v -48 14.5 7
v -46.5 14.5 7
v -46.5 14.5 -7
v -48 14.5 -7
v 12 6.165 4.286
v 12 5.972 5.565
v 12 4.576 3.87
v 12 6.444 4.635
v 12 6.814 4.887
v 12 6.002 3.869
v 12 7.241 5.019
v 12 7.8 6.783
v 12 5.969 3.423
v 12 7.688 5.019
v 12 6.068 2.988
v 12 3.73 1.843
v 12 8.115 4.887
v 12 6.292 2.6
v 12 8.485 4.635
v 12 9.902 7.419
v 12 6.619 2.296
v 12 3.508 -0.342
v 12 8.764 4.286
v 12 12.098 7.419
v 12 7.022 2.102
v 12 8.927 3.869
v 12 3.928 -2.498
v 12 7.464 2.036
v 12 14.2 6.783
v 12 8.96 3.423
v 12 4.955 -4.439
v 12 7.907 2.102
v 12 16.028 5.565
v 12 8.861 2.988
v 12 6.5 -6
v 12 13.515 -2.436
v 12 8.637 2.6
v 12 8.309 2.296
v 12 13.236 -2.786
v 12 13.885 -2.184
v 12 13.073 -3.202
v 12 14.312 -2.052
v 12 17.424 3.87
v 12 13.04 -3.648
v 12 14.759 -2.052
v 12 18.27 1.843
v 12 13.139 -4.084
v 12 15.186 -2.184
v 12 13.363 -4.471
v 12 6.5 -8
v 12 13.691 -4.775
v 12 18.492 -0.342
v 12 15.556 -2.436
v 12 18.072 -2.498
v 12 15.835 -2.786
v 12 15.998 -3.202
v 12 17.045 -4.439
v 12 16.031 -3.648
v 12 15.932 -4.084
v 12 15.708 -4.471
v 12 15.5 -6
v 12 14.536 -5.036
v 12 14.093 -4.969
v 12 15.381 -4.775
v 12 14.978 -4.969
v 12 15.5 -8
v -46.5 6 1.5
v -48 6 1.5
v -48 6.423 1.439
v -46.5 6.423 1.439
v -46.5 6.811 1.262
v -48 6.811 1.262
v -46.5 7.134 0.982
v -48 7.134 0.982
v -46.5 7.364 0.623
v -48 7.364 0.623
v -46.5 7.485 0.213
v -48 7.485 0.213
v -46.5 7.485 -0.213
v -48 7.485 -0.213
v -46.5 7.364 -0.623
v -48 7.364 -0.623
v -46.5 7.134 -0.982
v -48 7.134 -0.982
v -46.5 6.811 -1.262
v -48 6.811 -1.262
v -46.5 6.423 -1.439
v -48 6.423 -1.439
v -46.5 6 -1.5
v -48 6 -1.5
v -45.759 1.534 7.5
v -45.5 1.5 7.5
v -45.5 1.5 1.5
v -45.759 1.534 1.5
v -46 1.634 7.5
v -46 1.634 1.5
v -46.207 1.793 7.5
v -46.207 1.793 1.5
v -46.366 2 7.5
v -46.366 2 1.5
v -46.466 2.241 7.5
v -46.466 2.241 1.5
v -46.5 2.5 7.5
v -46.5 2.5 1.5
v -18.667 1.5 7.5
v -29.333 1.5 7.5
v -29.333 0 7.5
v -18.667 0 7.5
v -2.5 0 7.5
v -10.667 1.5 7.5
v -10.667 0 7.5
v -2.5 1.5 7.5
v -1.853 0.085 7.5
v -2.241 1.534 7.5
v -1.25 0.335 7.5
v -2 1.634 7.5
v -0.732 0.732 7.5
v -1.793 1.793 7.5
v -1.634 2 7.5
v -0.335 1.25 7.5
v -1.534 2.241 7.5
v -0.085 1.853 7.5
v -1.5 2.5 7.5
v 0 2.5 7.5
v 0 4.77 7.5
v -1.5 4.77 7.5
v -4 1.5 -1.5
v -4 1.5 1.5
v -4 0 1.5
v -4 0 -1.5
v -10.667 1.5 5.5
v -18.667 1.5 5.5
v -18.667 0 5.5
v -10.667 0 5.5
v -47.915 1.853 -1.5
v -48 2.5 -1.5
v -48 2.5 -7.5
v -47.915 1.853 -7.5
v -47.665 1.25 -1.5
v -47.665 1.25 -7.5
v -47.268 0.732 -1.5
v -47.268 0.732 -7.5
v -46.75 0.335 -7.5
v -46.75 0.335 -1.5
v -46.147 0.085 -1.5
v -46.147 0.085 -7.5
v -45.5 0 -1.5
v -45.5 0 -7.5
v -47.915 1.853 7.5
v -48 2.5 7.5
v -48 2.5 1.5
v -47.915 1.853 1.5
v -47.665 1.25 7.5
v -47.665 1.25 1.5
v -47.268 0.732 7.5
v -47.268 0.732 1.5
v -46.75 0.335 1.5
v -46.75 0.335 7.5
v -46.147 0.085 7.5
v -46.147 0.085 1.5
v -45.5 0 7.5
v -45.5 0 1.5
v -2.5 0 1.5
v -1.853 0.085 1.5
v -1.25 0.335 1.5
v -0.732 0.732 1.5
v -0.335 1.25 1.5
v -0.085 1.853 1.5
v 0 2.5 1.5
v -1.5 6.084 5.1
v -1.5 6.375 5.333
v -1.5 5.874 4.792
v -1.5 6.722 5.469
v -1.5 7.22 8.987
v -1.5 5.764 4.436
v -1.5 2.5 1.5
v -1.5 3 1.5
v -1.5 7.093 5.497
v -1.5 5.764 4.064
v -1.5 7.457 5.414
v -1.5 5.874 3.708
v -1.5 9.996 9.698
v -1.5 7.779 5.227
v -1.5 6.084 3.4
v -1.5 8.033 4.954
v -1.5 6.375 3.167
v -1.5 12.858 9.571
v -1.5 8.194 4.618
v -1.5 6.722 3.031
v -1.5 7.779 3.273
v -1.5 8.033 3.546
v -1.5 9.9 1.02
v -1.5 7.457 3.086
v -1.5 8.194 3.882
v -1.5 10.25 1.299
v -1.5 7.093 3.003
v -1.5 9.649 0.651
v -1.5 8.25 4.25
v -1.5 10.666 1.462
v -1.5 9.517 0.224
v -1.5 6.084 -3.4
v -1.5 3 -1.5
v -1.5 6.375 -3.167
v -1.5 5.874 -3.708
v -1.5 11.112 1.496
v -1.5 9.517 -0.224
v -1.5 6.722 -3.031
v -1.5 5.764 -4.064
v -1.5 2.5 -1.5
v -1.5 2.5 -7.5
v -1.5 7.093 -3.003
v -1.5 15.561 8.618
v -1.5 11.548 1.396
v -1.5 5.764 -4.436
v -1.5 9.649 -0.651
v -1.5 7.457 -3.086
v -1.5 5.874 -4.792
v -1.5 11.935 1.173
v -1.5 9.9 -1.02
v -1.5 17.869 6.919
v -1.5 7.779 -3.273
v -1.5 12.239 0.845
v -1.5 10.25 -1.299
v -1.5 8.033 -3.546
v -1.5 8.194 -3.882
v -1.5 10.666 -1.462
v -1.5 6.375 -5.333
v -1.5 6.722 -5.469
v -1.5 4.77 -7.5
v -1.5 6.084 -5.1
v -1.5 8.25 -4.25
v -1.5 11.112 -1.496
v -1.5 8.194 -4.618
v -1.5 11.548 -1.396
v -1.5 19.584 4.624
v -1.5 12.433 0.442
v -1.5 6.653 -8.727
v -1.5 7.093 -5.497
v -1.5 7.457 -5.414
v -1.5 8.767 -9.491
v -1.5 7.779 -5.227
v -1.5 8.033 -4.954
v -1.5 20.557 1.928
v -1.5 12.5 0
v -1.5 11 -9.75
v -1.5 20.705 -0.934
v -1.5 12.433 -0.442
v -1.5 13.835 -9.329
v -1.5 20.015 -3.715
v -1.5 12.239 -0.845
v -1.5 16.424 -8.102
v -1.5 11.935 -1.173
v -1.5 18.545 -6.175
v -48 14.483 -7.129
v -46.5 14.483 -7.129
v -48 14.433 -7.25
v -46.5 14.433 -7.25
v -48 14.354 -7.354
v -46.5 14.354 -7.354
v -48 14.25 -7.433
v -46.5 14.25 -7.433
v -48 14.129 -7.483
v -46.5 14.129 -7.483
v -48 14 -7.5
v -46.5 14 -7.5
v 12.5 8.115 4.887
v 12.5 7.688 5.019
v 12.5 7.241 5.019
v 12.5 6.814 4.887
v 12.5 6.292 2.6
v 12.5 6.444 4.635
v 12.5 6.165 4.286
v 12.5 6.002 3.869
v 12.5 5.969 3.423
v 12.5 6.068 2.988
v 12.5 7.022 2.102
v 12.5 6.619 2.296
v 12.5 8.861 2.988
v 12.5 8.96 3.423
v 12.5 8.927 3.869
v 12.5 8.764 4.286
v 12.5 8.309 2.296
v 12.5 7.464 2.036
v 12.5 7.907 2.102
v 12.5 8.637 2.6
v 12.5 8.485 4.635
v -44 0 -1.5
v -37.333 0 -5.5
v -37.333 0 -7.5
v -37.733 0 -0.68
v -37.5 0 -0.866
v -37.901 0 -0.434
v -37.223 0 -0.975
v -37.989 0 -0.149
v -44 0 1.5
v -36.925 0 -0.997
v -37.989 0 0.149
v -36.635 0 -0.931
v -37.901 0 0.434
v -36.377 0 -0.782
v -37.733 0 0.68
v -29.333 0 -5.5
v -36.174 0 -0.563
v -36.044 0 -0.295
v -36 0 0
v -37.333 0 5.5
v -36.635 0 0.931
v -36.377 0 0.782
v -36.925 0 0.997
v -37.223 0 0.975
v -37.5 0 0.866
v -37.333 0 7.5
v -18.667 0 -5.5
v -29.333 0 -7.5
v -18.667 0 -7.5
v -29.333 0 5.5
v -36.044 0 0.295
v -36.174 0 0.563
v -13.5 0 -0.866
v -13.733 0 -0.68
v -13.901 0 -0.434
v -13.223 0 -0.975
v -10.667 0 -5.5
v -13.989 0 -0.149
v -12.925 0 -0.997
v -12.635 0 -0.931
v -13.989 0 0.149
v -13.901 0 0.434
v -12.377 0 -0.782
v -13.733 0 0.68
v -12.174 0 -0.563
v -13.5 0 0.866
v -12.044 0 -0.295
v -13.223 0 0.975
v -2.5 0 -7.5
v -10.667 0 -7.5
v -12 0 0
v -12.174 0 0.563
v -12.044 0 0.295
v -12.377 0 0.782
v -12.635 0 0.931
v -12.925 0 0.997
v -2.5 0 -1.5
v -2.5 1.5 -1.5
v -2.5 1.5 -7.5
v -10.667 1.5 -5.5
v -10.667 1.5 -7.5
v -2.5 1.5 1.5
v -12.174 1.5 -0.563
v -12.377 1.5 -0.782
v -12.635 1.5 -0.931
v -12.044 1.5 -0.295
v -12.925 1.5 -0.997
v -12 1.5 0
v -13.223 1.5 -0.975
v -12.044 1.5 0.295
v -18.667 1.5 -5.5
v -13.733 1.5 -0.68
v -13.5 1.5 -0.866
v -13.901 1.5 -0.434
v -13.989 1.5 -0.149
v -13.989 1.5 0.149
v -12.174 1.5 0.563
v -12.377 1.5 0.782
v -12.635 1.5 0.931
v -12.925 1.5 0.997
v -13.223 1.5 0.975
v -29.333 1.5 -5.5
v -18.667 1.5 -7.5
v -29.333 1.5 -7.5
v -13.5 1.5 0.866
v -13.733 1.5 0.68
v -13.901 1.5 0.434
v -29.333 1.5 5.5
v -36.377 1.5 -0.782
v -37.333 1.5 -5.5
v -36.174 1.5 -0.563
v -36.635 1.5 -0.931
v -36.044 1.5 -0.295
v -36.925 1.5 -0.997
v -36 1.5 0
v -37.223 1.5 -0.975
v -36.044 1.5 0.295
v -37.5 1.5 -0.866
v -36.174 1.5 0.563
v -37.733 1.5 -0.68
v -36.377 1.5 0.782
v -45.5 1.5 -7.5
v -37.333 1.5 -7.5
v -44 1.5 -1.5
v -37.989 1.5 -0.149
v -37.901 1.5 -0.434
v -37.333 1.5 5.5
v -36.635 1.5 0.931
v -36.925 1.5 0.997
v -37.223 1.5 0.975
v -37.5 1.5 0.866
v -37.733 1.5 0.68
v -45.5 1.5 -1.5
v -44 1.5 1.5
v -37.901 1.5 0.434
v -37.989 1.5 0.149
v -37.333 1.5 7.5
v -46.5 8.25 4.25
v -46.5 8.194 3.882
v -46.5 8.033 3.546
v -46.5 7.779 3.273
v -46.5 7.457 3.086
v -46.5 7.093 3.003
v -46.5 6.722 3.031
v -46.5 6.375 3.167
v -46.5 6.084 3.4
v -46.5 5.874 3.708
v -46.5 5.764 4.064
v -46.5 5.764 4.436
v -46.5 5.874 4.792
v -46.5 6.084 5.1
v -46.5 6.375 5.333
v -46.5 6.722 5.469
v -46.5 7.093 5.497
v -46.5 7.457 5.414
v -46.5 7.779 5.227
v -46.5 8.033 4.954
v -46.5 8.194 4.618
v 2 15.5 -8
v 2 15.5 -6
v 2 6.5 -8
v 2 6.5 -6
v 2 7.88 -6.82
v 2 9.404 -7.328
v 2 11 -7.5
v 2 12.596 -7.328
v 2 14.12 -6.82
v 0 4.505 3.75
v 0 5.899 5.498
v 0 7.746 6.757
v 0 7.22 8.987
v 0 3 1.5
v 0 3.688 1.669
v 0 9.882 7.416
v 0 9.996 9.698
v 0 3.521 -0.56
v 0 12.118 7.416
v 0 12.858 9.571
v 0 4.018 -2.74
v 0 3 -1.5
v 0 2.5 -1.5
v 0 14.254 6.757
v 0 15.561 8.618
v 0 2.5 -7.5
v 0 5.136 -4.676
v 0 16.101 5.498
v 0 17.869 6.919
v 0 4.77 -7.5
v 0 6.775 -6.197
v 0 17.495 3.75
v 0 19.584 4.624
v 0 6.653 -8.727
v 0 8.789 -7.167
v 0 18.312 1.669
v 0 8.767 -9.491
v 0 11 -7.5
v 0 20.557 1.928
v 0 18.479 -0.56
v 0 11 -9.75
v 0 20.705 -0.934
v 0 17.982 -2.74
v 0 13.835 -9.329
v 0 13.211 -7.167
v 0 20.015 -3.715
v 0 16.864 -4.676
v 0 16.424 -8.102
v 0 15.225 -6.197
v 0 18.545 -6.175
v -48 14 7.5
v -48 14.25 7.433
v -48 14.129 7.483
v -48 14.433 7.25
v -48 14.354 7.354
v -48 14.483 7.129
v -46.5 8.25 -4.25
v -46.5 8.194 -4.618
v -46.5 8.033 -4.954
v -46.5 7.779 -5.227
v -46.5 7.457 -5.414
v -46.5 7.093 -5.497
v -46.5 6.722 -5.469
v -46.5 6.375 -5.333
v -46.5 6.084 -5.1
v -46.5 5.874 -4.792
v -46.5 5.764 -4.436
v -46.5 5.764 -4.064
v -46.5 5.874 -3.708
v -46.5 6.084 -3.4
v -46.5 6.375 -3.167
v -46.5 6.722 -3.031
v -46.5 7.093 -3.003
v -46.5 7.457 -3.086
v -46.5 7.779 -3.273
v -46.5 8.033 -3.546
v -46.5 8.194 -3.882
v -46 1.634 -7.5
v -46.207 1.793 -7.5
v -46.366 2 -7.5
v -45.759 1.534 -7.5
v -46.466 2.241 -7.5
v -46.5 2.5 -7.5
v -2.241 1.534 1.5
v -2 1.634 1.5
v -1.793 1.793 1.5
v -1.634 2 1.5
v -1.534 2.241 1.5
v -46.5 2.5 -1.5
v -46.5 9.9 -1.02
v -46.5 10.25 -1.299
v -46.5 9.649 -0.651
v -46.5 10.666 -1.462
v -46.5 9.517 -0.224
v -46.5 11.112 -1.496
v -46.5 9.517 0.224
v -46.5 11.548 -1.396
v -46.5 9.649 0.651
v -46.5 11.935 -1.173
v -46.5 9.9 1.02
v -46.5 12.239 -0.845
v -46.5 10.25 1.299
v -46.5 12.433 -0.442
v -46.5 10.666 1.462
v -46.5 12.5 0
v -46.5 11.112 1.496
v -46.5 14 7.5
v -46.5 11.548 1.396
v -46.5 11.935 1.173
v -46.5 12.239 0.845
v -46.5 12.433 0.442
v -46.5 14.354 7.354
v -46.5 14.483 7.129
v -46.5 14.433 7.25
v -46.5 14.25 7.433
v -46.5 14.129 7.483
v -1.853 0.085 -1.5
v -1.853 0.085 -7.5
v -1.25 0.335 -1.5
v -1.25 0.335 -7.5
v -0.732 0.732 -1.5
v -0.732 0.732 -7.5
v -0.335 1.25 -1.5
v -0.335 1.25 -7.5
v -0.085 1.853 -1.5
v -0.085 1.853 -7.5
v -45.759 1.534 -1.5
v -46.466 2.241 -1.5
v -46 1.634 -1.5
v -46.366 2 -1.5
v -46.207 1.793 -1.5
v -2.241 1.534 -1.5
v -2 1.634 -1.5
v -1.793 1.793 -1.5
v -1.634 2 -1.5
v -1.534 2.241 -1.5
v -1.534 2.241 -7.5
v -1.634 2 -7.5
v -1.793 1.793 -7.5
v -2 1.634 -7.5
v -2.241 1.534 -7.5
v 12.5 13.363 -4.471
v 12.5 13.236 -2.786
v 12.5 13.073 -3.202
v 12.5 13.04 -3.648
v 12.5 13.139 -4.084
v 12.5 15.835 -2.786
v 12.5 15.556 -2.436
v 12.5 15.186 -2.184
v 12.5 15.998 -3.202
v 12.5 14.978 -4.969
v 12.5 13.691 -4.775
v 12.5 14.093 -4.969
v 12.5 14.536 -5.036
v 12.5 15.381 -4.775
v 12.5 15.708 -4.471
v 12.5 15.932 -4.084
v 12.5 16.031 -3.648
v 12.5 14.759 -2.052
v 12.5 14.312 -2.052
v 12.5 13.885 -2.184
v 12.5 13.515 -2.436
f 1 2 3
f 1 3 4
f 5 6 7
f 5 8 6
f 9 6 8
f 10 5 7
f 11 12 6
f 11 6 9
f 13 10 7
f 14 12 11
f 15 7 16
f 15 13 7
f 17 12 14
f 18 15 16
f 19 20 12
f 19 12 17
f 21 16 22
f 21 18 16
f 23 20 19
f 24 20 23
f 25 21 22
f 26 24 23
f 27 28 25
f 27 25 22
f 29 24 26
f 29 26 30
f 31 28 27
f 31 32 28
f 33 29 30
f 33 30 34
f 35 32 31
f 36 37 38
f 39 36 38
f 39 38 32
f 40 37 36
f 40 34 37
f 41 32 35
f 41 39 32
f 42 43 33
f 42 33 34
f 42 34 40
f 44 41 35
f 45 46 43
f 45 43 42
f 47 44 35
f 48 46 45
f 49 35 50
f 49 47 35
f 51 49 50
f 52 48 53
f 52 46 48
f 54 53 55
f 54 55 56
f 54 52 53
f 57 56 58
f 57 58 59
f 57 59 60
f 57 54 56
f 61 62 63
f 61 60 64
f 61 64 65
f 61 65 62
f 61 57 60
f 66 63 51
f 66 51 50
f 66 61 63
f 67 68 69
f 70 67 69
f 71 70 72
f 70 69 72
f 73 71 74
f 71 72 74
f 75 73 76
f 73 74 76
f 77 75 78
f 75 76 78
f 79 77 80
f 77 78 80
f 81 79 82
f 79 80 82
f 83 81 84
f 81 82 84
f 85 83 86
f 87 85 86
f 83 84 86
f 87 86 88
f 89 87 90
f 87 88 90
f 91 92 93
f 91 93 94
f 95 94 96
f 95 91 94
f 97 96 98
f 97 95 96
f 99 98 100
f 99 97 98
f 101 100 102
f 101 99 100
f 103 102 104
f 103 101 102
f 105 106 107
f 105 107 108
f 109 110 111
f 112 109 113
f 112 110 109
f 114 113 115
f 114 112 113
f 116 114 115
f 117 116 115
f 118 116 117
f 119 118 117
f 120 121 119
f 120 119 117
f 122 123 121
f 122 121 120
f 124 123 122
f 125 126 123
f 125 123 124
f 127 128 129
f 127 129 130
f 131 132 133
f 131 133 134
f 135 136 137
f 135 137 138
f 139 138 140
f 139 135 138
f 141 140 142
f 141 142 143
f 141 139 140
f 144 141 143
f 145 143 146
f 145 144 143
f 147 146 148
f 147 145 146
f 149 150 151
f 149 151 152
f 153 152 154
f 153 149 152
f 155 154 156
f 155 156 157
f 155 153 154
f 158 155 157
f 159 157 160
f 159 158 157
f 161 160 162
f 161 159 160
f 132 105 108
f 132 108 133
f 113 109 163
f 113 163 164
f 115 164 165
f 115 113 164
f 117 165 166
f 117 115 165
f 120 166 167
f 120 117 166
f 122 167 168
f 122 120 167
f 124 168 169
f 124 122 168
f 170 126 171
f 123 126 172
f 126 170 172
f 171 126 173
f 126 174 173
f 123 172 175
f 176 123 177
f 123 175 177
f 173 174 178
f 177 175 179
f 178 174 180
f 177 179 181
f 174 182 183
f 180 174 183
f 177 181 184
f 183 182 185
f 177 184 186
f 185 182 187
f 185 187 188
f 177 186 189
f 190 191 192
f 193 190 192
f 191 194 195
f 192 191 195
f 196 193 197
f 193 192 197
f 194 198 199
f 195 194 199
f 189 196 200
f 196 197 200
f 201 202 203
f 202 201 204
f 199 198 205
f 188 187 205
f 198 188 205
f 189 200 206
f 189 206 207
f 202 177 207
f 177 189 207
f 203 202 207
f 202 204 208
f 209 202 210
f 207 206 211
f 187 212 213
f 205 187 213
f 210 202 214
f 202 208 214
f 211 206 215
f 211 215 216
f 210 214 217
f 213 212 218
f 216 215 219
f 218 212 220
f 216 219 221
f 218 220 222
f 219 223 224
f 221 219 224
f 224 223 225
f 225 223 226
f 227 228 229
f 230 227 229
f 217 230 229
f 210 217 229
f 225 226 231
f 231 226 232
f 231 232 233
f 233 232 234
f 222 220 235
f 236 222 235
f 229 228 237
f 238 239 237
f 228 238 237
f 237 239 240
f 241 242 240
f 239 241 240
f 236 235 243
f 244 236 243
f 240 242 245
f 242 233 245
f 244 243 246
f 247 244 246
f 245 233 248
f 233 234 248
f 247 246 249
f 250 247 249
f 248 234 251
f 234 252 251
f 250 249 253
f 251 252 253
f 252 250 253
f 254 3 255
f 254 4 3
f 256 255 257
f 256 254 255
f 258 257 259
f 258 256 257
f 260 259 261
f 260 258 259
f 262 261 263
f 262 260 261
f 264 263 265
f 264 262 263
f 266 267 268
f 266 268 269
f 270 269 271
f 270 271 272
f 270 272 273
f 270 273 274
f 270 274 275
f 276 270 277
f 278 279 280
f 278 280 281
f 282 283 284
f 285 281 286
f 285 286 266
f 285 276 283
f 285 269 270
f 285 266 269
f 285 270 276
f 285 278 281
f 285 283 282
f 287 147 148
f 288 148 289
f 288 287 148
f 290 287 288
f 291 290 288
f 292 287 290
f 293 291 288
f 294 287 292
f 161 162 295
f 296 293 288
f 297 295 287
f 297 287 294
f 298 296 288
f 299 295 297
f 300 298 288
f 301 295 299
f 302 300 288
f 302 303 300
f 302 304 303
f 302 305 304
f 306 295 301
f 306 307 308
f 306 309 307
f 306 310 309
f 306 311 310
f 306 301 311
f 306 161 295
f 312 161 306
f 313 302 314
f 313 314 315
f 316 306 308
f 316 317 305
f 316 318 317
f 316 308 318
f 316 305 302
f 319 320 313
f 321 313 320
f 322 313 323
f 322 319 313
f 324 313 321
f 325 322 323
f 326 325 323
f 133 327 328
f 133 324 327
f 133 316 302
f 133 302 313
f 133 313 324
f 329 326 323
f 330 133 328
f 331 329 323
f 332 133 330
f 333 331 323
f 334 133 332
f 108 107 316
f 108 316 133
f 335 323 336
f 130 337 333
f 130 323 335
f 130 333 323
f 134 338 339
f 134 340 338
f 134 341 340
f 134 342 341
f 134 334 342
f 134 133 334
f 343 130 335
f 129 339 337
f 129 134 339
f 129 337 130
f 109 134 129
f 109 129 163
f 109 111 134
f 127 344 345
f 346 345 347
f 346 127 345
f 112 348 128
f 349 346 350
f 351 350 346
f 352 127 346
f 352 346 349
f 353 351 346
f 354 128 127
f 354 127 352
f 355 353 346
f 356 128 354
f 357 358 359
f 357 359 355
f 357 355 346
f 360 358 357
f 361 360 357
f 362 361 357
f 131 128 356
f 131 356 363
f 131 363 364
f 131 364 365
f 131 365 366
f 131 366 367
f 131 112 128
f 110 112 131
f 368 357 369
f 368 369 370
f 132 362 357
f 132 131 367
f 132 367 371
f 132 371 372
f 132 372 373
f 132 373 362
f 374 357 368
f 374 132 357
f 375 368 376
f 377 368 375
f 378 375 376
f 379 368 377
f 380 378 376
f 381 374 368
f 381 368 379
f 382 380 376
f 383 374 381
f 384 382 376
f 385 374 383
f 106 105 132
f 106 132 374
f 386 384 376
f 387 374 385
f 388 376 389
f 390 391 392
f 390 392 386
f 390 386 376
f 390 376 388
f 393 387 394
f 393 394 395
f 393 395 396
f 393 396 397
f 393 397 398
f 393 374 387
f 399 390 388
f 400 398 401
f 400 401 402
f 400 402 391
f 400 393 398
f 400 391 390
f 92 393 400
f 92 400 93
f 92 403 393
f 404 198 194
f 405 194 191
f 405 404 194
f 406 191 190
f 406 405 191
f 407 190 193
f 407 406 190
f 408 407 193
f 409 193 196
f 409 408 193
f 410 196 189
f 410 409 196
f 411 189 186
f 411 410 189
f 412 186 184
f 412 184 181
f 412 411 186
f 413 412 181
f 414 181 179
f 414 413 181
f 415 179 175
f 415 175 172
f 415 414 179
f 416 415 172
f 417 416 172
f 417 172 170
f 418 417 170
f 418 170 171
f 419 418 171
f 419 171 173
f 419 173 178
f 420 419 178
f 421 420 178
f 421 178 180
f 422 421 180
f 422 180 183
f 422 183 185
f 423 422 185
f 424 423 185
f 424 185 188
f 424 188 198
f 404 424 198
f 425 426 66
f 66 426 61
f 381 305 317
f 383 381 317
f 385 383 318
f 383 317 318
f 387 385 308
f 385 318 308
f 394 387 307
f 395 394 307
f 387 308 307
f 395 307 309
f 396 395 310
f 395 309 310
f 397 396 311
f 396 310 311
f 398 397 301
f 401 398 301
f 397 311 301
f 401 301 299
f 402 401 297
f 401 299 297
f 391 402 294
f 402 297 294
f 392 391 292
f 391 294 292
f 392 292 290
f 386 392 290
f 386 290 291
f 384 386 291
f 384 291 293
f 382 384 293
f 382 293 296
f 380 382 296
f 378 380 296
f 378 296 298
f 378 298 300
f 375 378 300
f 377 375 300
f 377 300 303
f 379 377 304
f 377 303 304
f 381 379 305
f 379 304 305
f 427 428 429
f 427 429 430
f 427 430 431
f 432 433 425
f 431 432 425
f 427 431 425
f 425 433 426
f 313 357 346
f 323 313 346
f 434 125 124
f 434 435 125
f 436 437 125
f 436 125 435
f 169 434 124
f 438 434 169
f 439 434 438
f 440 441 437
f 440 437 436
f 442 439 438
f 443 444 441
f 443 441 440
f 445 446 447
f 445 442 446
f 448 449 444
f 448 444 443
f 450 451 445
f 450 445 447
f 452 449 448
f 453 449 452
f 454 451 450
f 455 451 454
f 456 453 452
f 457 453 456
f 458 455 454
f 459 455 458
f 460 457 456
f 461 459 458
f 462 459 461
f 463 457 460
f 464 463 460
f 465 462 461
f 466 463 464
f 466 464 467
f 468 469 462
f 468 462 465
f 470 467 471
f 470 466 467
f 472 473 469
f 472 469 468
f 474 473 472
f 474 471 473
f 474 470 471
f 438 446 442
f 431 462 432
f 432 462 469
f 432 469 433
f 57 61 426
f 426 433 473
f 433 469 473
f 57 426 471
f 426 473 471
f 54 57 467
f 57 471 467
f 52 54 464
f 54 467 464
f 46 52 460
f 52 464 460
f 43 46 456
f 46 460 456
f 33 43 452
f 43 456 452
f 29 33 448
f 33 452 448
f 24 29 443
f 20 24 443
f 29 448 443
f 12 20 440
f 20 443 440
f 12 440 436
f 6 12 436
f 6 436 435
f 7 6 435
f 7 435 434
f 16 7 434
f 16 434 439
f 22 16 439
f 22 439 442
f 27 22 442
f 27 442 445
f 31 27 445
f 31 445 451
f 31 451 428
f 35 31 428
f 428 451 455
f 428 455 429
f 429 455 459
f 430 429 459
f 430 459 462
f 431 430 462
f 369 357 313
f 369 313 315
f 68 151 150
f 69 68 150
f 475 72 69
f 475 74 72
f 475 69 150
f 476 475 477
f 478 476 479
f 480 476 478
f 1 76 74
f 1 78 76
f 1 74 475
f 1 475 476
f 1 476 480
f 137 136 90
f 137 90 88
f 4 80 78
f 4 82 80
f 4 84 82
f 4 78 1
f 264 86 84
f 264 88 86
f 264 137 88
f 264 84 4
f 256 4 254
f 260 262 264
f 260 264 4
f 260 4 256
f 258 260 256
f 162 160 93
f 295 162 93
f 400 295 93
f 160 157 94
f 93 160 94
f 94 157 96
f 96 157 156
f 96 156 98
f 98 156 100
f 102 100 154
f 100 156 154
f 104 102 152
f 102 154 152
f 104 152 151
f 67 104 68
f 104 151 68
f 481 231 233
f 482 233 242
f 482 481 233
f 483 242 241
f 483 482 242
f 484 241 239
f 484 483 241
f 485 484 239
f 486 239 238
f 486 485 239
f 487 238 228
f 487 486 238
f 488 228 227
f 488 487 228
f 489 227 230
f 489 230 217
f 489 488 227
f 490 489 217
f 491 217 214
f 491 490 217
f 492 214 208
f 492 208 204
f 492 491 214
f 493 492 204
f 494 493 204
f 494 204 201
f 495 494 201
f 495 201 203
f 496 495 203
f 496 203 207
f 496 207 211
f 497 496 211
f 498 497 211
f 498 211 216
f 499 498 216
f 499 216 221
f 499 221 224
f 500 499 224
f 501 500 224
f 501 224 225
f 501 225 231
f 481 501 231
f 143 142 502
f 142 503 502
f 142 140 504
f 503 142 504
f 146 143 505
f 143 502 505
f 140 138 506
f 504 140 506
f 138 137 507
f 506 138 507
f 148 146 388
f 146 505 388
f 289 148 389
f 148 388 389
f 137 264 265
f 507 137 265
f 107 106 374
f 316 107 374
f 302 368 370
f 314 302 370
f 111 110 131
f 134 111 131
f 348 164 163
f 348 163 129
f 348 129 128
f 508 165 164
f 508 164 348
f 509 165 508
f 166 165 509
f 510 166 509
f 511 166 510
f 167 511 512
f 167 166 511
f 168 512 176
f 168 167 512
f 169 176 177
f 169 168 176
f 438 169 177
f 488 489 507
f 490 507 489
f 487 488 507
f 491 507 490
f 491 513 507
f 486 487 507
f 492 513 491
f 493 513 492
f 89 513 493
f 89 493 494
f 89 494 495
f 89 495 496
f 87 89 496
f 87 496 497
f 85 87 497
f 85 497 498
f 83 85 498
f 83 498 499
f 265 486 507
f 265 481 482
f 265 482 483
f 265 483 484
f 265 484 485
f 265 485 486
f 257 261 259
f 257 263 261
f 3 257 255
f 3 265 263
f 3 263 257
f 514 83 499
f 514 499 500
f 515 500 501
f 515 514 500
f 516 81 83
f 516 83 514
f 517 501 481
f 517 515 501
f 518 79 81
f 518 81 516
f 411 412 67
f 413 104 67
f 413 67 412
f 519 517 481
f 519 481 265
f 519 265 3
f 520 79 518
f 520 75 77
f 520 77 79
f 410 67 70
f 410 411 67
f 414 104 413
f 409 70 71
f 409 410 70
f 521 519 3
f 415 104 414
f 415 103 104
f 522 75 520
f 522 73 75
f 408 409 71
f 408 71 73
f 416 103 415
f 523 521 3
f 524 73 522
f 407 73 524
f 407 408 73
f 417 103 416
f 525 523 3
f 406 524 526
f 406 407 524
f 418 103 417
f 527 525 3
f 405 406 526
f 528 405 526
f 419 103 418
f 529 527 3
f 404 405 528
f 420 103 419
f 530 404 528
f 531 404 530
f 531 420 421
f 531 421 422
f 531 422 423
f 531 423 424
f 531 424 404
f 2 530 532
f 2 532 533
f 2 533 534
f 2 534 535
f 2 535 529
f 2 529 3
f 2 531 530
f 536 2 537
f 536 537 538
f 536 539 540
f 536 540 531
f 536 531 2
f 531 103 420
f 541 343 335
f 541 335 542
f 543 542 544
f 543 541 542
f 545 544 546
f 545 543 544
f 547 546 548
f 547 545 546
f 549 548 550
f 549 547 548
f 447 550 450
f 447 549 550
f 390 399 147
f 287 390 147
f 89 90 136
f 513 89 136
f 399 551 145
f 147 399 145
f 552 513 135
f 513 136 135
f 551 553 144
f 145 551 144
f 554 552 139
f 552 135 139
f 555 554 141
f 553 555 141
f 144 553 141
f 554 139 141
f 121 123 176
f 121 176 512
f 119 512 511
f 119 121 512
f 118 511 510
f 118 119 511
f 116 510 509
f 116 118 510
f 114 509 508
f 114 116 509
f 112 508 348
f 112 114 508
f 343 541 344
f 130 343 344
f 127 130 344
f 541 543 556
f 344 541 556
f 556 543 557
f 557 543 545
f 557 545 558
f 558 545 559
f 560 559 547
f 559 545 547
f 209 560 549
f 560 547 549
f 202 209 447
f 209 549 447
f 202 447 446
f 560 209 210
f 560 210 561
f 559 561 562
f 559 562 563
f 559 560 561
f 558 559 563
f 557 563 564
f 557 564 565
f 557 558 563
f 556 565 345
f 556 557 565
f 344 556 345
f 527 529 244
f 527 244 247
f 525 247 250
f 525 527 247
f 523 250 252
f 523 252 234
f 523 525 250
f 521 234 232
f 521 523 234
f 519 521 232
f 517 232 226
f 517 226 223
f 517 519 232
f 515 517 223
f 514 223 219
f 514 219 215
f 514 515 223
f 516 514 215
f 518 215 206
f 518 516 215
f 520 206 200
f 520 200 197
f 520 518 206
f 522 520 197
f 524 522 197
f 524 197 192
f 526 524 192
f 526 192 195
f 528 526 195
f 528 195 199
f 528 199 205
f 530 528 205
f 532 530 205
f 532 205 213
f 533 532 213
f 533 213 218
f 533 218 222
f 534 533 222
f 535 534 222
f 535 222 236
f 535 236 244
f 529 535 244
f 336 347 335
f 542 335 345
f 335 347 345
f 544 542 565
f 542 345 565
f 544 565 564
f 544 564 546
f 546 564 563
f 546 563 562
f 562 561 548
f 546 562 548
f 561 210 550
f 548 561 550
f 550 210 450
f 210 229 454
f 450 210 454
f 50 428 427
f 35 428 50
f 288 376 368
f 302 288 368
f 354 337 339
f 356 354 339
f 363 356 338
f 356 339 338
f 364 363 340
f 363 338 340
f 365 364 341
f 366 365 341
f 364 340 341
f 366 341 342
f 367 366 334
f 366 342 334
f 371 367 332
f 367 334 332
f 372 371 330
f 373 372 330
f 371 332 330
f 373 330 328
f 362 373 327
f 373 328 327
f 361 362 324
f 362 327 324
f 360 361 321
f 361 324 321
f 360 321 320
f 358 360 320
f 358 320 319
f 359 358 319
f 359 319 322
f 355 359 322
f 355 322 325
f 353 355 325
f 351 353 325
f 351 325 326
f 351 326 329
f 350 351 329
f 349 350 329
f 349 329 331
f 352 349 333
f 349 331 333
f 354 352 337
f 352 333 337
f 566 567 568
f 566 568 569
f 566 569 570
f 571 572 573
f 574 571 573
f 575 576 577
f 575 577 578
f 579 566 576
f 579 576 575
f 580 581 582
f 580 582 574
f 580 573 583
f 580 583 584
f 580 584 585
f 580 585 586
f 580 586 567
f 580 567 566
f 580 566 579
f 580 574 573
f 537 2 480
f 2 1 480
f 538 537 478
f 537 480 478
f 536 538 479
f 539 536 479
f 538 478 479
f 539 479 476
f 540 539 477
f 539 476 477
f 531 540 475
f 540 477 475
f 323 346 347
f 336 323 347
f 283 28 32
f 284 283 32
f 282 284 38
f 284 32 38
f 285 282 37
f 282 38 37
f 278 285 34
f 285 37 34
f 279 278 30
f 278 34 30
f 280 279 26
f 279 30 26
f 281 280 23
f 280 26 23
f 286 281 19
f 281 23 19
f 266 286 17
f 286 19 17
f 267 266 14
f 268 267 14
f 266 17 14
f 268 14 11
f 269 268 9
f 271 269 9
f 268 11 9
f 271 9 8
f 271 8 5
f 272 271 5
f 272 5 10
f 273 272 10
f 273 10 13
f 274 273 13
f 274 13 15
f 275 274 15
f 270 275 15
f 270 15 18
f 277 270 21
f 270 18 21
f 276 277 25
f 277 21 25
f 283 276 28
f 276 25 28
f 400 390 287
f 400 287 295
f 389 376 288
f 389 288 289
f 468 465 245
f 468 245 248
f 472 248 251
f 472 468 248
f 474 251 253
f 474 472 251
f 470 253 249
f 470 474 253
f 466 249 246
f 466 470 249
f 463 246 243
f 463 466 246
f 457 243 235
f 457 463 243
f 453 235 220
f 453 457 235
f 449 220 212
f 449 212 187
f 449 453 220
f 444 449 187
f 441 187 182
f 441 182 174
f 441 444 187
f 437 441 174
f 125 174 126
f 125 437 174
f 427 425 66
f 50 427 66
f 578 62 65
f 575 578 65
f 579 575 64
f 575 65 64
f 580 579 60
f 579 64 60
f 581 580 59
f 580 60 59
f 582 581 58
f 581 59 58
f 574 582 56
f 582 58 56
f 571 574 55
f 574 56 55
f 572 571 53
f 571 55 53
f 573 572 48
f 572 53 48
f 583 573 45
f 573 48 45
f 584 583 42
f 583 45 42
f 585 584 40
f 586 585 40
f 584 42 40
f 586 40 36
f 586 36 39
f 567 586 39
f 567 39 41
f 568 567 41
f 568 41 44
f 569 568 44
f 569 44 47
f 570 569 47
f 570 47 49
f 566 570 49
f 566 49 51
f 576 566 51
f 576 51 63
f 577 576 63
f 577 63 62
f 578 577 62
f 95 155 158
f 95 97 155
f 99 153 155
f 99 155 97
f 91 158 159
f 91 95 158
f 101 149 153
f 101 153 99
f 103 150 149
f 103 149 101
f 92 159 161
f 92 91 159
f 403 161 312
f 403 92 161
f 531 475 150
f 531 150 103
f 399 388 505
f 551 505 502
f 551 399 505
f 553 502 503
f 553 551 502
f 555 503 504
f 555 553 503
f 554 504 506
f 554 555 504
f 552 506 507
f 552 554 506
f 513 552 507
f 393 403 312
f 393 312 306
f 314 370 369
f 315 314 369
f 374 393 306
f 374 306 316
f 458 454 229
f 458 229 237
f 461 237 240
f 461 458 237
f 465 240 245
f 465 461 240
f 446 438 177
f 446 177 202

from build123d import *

# Parameters (mm, degrees)
BOSS_EXTRUDE1_DEPTH = 7.5
BOSS_EXTRUDE2_DEPTH = 1.5
SKETCH4_R           = 7.5
BOSS_EXTRUDE3_DEPTH = 12
SKETCH5_R           = 1.5
SKETCH5_R_2         = 1.25
BOSS_EXTRUDE4_DEPTH = 46.5
SKETCH6_R           = 1
CUT_EXTRUDE1_DEPTH  = 1.5
SKETCH7_R           = 1.5
BOSS_EXTRUDE5_DEPTH = 0.5
SKETCH8_W           = 8
SKETCH8_H           = 2
CUT_EXTRUDE2_DEPTH  = 53.627226794
FILLET1_R           = 0.5
SKETCH9_W           = 3
SKETCH9_H           = 3.5
SKETCH9_H_2         = 8.5
CUT_EXTRUDE3_DEPTH  = 4
SKETCH10_W          = 3
SKETCH10_H          = 6
CUT_EXTRUDE4_DEPTH  = 4
SKETCH12_W          = 10
SKETCH12_H          = 9
BOSS_EXTRUDE6_DEPTH = 8


with BuildPart() as part:
    # Sketch1 → Boss-Extrude1 (new, symmetric)
    with BuildSketch(Plane.XY):
        with BuildLine():
            Line((-46.5, 14.5), (-48, 14.5))
            Line((-48, 14.5), (-48, 2.5))
            ThreePointArc((-48, 2.5), (-47.267766953, 0.732233047), (-45.5, 0))
            Line((-45.5, 0), (-2.5, 0))
            ThreePointArc((-2.5, 0), (-0.732233047, 0.732233047), (0, 2.5))
            Line((0, 2.5), (0, 14.5))
            Line((0, 14.5), (-1.5, 14.5))
            Line((-1.5, 14.5), (-1.5, 2.5))
            ThreePointArc((-1.5, 2.5), (-1.792893219, 1.792893219), (-2.5, 1.5))
            Line((-2.5, 1.5), (-45.5, 1.5))
            ThreePointArc((-45.5, 1.5), (-46.207106781, 1.792893219), (-46.5, 2.5))
            Line((-46.5, 2.5), (-46.5, 14.5))
        make_face()
    extrude(amount=BOSS_EXTRUDE1_DEPTH, both=True)

    # Sketch3 → Boss-Extrude2 (add)
    with BuildSketch(Plane(origin=(0, 0, 0), x_dir=(0, 0, -1), z_dir=(1, 0, 0))):
        with BuildLine():
            ThreePointArc((7.5, 4.770032103), (9.170264445, 7.688089675), (9.75, 11))
            ThreePointArc((9.75, 11), (-3.311910325, 20.170264445), (-7.5, 4.770032103))
            Line((-7.5, 4.770032103), (-7.5, 14.5))
            Line((-7.5, 14.5), (7.5, 14.5))
            Line((7.5, 14.5), (7.5, 4.770032103))
        make_face()
    extrude(amount=-BOSS_EXTRUDE2_DEPTH)

    # Sketch4 → Boss-Extrude3 (add)
    with BuildSketch(Plane(origin=(0, 0, 0), x_dir=(0, 0, -1), z_dir=(1, 0, 0))):
        with Locations((0, 11)):
            Circle(SKETCH4_R)
    extrude(amount=BOSS_EXTRUDE3_DEPTH)

    # Sketch5 → Boss-Extrude4 (add)
    with BuildSketch(Plane.ZY.offset(48)):
        with Locations(Location((0, 11, 0), (0, 0, 90))):
            Circle(SKETCH5_R)
        with Locations(Location((4.25, 7, 0), (0, 0, 90))):
            Circle(SKETCH5_R_2)
        with Locations(Location((-4.25, 7, 0), (0, 0, 90))):
            Circle(SKETCH5_R_2)
    extrude(amount=-BOSS_EXTRUDE4_DEPTH)

    # Sketch6 → Cut-Extrude1 (cut)
    with BuildSketch(Plane.XZ):
        with Locations((-37, 0)):
            Circle(SKETCH6_R)
        with Locations((-13, 0)):
            Circle(SKETCH6_R)
    extrude(amount=-CUT_EXTRUDE1_DEPTH, mode=Mode.SUBTRACT)

    # Sketch7 → Boss-Extrude5 (add)
    with BuildSketch(Plane(origin=(12, 0, 0), x_dir=(0, 0, -1), z_dir=(1, 0, 0))):
        with Locations((3.535533906, 14.535533906)):
            Circle(SKETCH7_R)
        with Locations((-3.535533906, 7.464466094)):
            Circle(SKETCH7_R)
    extrude(amount=BOSS_EXTRUDE5_DEPTH)

    # Sketch8 → Cut-Extrude2 (cut, through all)
    with BuildSketch(Plane(origin=(0, 1.5, 0), x_dir=(1, 0, 0), z_dir=(0, 1, 0))):
        with Locations((-33.333333333, -6.5)):
            Rectangle(SKETCH8_W, SKETCH8_H)
        with Locations((-14.666666667, -6.5)):
            Rectangle(SKETCH8_W, SKETCH8_H)
        with Locations((-14.666666667, 6.5)):
            Rectangle(SKETCH8_W, SKETCH8_H)
        with Locations((-33.333333333, 6.5)):
            Rectangle(SKETCH8_W, SKETCH8_H)
    extrude(amount=-CUT_EXTRUDE2_DEPTH, mode=Mode.SUBTRACT)

    # Fillet1
    fillet1_edges = [part.edges().sort_by_distance(p)[0] for p in [
        (-47.25, 14.5, -7.5),
        (-47.25, 14.5, 7.5),
    ]]
    fillet(fillet1_edges, radius=FILLET1_R)

    # Sketch9 → Cut-Extrude3 (cut)
    with BuildSketch(Plane.ZY.offset(48)):
        with BuildLine():
            Line((-1.5, 6), (1.5, 6))
            ThreePointArc((1.5, 6), (0, 7.5), (-1.5, 6))
        make_face()
        with Locations((0, 4.25)):
            Rectangle(SKETCH9_W, SKETCH9_H)
        with Locations((0, -1.75)):
            Rectangle(SKETCH9_W, SKETCH9_H_2)
    extrude(amount=-CUT_EXTRUDE3_DEPTH, mode=Mode.SUBTRACT)

    # Sketch10 → Cut-Extrude4 (cut)
    with BuildSketch(Plane(origin=(0, 0, 0), x_dir=(0, 0, -1), z_dir=(1, 0, 0))):
        Rectangle(SKETCH10_W, SKETCH10_H)
    extrude(amount=-CUT_EXTRUDE4_DEPTH, mode=Mode.SUBTRACT)

    # Sketch12 → Boss-Extrude6 (add)
    with BuildSketch(Plane.XY):
        with Locations((7, 11)):
            Rectangle(SKETCH12_W, SKETCH12_H)
    extrude(amount=-BOSS_EXTRUDE6_DEPTH)


solid = part.part
